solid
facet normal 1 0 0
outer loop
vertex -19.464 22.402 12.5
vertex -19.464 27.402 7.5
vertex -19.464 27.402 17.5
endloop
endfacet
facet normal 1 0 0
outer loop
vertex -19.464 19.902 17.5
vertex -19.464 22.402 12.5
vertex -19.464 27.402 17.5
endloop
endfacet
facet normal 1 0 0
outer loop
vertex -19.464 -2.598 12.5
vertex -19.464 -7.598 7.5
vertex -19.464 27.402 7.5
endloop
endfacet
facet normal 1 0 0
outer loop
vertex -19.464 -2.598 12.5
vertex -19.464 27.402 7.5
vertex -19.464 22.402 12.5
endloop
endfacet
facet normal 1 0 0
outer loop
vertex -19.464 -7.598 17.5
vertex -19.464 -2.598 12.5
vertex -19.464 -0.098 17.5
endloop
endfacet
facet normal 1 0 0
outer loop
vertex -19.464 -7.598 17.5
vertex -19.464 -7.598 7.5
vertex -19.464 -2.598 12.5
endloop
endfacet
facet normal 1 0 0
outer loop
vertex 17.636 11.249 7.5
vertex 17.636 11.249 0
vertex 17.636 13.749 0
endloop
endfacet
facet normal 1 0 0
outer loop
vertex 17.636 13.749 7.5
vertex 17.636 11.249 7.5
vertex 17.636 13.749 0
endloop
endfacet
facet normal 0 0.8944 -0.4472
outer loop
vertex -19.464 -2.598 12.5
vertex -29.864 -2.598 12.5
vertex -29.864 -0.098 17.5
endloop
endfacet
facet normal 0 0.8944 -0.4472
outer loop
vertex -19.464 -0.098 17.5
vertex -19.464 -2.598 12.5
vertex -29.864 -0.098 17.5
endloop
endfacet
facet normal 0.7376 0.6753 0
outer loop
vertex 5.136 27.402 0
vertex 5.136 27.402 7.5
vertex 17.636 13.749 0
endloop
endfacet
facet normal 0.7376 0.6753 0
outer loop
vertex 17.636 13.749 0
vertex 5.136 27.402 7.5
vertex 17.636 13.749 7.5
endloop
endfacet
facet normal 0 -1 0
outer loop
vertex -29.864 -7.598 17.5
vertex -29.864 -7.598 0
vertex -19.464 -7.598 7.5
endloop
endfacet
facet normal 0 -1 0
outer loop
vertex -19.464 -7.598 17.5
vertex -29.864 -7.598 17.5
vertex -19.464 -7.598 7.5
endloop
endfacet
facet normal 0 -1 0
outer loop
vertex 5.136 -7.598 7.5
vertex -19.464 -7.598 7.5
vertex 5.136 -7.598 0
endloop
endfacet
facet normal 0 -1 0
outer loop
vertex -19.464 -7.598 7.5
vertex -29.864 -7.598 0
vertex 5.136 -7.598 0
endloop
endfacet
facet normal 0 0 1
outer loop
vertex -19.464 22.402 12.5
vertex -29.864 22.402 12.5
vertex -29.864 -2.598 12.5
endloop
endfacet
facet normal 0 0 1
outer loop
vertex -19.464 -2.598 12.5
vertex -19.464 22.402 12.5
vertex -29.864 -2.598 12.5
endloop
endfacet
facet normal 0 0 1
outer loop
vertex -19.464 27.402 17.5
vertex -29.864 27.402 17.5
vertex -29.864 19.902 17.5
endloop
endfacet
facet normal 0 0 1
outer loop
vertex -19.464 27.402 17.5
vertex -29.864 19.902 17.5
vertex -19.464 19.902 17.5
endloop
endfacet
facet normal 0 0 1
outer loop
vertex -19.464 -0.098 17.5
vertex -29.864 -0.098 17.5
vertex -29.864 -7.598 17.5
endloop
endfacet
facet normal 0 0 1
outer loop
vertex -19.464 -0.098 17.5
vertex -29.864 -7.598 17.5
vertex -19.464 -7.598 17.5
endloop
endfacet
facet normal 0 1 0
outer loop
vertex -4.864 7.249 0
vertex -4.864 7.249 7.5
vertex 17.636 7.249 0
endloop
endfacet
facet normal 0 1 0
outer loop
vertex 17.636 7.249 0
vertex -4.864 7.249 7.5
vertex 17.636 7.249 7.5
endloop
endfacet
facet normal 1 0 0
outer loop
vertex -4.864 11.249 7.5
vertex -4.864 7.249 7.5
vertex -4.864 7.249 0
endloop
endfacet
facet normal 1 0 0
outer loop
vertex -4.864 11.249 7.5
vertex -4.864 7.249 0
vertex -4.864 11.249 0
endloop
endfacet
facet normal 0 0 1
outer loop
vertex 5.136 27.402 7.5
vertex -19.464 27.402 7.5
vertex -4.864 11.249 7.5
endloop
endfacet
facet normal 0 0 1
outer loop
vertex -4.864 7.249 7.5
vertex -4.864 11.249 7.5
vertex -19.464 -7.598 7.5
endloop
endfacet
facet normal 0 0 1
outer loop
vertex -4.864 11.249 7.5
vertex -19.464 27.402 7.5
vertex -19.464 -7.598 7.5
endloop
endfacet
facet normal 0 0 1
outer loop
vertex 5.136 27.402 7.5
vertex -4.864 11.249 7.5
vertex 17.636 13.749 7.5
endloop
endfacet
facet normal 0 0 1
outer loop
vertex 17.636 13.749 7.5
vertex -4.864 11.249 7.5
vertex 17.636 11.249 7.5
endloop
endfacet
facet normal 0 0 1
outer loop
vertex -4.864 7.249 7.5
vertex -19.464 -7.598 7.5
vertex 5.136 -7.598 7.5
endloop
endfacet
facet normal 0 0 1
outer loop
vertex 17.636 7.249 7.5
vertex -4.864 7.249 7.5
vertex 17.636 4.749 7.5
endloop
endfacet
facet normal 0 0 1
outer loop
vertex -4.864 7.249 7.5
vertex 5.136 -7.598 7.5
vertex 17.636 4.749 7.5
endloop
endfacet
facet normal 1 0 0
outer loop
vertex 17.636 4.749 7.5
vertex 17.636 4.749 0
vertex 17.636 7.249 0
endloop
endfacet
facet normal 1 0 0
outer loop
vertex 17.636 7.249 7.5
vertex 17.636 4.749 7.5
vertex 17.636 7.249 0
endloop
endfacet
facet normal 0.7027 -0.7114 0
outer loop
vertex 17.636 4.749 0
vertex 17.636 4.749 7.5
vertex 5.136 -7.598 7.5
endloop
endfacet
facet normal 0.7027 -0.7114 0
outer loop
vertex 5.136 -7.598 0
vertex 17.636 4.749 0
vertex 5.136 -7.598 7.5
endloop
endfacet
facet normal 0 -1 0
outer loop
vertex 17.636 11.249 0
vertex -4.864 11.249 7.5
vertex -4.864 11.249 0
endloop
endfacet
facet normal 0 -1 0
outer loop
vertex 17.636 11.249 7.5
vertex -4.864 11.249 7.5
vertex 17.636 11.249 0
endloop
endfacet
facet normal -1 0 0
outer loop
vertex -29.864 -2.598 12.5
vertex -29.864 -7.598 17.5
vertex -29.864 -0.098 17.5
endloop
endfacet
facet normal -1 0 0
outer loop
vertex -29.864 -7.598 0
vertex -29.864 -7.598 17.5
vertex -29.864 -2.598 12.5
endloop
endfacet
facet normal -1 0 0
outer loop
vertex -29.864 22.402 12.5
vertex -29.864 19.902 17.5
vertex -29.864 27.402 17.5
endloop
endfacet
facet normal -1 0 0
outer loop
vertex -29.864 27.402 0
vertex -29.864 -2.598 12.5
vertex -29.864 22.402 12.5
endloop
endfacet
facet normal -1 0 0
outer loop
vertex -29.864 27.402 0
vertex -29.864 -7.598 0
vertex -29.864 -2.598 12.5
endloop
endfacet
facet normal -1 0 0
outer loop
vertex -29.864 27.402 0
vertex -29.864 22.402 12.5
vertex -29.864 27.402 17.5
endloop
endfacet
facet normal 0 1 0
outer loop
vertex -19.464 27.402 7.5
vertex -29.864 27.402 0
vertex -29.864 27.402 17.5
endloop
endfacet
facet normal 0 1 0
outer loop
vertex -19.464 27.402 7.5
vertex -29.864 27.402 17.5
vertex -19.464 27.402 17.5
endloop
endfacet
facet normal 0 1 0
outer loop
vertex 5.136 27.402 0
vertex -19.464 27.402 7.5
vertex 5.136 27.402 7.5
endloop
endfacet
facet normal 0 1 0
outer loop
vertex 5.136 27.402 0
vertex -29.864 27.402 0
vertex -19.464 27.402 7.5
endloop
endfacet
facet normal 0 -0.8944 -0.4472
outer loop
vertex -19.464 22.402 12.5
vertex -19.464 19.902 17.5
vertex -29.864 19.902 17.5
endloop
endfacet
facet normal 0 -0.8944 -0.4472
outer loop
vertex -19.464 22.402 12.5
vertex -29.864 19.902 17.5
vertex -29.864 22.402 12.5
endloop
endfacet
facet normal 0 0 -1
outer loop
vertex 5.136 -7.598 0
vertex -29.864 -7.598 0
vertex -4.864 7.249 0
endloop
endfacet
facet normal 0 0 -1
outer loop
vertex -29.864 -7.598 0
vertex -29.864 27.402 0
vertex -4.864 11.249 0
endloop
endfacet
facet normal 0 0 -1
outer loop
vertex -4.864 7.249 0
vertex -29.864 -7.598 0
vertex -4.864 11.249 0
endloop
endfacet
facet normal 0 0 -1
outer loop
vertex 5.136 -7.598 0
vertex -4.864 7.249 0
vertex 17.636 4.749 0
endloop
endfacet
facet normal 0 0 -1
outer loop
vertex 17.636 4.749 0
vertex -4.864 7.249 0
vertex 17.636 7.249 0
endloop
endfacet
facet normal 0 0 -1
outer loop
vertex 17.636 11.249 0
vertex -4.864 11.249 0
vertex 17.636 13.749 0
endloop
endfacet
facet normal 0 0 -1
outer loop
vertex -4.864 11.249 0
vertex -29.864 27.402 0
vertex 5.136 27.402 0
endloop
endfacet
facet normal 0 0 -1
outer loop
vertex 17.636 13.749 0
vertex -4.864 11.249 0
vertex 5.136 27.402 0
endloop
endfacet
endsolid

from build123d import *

# Parameters (mm, degrees)
F0_W     = 47.5
F0_H     = 35
F1_DEPTH = 17.5
F2_W     = 37.100266
F2_H     = 10
F3_DEPTH = 35.001
F5_DEPTH = 47.501
F6_W     = 22.5
F6_H     = 4
F7_DEPTH = 7.501


with BuildPart() as f1:
    # F0 (on Top) → F1 (new body)
    with BuildSketch(Plane.XY):
        with Locations((-6.113795, 9.902082)):
            Rectangle(F0_W, F0_H)
    extrude(amount=F1_DEPTH)

    # F2 (on face) → F3 (cut, through all)
    with BuildSketch(Plane.XZ.offset(7.597918)):
        with Locations((-0.913928, 12.5)):
            Rectangle(F2_W, F2_H)
    extrude(amount=-F3_DEPTH, mode=Mode.SUBTRACT)

    # F4 (on face) → F5 (cut, through all)
    with BuildSketch(Plane(origin=(-29.863795, 0, 0), x_dir=(0, -1, 0), z_dir=(-1, 0, 0))):
        Polygon((-19.902082, 17.5), (-22.402082, 12.5), (2.597918, 12.5), (0.097918, 17.5), align=None)
    extrude(amount=-F5_DEPTH, mode=Mode.SUBTRACT)

    # F6 (on face) → F7 (cut, through all)
    with BuildSketch(Plane.XY.offset(7.5)):
        Polygon((5.136205, -7.597918), (17.636205, -7.597918), (17.636205, 4.74937), align=None)
        Polygon((17.636205, 27.402082), (5.136205, 27.402082), (17.636205, 13.74937), align=None)
        with Locations((6.386205, 9.24937)):
            Rectangle(F6_W, F6_H)
    extrude(amount=-F7_DEPTH, mode=Mode.SUBTRACT)


solid = f1.part
